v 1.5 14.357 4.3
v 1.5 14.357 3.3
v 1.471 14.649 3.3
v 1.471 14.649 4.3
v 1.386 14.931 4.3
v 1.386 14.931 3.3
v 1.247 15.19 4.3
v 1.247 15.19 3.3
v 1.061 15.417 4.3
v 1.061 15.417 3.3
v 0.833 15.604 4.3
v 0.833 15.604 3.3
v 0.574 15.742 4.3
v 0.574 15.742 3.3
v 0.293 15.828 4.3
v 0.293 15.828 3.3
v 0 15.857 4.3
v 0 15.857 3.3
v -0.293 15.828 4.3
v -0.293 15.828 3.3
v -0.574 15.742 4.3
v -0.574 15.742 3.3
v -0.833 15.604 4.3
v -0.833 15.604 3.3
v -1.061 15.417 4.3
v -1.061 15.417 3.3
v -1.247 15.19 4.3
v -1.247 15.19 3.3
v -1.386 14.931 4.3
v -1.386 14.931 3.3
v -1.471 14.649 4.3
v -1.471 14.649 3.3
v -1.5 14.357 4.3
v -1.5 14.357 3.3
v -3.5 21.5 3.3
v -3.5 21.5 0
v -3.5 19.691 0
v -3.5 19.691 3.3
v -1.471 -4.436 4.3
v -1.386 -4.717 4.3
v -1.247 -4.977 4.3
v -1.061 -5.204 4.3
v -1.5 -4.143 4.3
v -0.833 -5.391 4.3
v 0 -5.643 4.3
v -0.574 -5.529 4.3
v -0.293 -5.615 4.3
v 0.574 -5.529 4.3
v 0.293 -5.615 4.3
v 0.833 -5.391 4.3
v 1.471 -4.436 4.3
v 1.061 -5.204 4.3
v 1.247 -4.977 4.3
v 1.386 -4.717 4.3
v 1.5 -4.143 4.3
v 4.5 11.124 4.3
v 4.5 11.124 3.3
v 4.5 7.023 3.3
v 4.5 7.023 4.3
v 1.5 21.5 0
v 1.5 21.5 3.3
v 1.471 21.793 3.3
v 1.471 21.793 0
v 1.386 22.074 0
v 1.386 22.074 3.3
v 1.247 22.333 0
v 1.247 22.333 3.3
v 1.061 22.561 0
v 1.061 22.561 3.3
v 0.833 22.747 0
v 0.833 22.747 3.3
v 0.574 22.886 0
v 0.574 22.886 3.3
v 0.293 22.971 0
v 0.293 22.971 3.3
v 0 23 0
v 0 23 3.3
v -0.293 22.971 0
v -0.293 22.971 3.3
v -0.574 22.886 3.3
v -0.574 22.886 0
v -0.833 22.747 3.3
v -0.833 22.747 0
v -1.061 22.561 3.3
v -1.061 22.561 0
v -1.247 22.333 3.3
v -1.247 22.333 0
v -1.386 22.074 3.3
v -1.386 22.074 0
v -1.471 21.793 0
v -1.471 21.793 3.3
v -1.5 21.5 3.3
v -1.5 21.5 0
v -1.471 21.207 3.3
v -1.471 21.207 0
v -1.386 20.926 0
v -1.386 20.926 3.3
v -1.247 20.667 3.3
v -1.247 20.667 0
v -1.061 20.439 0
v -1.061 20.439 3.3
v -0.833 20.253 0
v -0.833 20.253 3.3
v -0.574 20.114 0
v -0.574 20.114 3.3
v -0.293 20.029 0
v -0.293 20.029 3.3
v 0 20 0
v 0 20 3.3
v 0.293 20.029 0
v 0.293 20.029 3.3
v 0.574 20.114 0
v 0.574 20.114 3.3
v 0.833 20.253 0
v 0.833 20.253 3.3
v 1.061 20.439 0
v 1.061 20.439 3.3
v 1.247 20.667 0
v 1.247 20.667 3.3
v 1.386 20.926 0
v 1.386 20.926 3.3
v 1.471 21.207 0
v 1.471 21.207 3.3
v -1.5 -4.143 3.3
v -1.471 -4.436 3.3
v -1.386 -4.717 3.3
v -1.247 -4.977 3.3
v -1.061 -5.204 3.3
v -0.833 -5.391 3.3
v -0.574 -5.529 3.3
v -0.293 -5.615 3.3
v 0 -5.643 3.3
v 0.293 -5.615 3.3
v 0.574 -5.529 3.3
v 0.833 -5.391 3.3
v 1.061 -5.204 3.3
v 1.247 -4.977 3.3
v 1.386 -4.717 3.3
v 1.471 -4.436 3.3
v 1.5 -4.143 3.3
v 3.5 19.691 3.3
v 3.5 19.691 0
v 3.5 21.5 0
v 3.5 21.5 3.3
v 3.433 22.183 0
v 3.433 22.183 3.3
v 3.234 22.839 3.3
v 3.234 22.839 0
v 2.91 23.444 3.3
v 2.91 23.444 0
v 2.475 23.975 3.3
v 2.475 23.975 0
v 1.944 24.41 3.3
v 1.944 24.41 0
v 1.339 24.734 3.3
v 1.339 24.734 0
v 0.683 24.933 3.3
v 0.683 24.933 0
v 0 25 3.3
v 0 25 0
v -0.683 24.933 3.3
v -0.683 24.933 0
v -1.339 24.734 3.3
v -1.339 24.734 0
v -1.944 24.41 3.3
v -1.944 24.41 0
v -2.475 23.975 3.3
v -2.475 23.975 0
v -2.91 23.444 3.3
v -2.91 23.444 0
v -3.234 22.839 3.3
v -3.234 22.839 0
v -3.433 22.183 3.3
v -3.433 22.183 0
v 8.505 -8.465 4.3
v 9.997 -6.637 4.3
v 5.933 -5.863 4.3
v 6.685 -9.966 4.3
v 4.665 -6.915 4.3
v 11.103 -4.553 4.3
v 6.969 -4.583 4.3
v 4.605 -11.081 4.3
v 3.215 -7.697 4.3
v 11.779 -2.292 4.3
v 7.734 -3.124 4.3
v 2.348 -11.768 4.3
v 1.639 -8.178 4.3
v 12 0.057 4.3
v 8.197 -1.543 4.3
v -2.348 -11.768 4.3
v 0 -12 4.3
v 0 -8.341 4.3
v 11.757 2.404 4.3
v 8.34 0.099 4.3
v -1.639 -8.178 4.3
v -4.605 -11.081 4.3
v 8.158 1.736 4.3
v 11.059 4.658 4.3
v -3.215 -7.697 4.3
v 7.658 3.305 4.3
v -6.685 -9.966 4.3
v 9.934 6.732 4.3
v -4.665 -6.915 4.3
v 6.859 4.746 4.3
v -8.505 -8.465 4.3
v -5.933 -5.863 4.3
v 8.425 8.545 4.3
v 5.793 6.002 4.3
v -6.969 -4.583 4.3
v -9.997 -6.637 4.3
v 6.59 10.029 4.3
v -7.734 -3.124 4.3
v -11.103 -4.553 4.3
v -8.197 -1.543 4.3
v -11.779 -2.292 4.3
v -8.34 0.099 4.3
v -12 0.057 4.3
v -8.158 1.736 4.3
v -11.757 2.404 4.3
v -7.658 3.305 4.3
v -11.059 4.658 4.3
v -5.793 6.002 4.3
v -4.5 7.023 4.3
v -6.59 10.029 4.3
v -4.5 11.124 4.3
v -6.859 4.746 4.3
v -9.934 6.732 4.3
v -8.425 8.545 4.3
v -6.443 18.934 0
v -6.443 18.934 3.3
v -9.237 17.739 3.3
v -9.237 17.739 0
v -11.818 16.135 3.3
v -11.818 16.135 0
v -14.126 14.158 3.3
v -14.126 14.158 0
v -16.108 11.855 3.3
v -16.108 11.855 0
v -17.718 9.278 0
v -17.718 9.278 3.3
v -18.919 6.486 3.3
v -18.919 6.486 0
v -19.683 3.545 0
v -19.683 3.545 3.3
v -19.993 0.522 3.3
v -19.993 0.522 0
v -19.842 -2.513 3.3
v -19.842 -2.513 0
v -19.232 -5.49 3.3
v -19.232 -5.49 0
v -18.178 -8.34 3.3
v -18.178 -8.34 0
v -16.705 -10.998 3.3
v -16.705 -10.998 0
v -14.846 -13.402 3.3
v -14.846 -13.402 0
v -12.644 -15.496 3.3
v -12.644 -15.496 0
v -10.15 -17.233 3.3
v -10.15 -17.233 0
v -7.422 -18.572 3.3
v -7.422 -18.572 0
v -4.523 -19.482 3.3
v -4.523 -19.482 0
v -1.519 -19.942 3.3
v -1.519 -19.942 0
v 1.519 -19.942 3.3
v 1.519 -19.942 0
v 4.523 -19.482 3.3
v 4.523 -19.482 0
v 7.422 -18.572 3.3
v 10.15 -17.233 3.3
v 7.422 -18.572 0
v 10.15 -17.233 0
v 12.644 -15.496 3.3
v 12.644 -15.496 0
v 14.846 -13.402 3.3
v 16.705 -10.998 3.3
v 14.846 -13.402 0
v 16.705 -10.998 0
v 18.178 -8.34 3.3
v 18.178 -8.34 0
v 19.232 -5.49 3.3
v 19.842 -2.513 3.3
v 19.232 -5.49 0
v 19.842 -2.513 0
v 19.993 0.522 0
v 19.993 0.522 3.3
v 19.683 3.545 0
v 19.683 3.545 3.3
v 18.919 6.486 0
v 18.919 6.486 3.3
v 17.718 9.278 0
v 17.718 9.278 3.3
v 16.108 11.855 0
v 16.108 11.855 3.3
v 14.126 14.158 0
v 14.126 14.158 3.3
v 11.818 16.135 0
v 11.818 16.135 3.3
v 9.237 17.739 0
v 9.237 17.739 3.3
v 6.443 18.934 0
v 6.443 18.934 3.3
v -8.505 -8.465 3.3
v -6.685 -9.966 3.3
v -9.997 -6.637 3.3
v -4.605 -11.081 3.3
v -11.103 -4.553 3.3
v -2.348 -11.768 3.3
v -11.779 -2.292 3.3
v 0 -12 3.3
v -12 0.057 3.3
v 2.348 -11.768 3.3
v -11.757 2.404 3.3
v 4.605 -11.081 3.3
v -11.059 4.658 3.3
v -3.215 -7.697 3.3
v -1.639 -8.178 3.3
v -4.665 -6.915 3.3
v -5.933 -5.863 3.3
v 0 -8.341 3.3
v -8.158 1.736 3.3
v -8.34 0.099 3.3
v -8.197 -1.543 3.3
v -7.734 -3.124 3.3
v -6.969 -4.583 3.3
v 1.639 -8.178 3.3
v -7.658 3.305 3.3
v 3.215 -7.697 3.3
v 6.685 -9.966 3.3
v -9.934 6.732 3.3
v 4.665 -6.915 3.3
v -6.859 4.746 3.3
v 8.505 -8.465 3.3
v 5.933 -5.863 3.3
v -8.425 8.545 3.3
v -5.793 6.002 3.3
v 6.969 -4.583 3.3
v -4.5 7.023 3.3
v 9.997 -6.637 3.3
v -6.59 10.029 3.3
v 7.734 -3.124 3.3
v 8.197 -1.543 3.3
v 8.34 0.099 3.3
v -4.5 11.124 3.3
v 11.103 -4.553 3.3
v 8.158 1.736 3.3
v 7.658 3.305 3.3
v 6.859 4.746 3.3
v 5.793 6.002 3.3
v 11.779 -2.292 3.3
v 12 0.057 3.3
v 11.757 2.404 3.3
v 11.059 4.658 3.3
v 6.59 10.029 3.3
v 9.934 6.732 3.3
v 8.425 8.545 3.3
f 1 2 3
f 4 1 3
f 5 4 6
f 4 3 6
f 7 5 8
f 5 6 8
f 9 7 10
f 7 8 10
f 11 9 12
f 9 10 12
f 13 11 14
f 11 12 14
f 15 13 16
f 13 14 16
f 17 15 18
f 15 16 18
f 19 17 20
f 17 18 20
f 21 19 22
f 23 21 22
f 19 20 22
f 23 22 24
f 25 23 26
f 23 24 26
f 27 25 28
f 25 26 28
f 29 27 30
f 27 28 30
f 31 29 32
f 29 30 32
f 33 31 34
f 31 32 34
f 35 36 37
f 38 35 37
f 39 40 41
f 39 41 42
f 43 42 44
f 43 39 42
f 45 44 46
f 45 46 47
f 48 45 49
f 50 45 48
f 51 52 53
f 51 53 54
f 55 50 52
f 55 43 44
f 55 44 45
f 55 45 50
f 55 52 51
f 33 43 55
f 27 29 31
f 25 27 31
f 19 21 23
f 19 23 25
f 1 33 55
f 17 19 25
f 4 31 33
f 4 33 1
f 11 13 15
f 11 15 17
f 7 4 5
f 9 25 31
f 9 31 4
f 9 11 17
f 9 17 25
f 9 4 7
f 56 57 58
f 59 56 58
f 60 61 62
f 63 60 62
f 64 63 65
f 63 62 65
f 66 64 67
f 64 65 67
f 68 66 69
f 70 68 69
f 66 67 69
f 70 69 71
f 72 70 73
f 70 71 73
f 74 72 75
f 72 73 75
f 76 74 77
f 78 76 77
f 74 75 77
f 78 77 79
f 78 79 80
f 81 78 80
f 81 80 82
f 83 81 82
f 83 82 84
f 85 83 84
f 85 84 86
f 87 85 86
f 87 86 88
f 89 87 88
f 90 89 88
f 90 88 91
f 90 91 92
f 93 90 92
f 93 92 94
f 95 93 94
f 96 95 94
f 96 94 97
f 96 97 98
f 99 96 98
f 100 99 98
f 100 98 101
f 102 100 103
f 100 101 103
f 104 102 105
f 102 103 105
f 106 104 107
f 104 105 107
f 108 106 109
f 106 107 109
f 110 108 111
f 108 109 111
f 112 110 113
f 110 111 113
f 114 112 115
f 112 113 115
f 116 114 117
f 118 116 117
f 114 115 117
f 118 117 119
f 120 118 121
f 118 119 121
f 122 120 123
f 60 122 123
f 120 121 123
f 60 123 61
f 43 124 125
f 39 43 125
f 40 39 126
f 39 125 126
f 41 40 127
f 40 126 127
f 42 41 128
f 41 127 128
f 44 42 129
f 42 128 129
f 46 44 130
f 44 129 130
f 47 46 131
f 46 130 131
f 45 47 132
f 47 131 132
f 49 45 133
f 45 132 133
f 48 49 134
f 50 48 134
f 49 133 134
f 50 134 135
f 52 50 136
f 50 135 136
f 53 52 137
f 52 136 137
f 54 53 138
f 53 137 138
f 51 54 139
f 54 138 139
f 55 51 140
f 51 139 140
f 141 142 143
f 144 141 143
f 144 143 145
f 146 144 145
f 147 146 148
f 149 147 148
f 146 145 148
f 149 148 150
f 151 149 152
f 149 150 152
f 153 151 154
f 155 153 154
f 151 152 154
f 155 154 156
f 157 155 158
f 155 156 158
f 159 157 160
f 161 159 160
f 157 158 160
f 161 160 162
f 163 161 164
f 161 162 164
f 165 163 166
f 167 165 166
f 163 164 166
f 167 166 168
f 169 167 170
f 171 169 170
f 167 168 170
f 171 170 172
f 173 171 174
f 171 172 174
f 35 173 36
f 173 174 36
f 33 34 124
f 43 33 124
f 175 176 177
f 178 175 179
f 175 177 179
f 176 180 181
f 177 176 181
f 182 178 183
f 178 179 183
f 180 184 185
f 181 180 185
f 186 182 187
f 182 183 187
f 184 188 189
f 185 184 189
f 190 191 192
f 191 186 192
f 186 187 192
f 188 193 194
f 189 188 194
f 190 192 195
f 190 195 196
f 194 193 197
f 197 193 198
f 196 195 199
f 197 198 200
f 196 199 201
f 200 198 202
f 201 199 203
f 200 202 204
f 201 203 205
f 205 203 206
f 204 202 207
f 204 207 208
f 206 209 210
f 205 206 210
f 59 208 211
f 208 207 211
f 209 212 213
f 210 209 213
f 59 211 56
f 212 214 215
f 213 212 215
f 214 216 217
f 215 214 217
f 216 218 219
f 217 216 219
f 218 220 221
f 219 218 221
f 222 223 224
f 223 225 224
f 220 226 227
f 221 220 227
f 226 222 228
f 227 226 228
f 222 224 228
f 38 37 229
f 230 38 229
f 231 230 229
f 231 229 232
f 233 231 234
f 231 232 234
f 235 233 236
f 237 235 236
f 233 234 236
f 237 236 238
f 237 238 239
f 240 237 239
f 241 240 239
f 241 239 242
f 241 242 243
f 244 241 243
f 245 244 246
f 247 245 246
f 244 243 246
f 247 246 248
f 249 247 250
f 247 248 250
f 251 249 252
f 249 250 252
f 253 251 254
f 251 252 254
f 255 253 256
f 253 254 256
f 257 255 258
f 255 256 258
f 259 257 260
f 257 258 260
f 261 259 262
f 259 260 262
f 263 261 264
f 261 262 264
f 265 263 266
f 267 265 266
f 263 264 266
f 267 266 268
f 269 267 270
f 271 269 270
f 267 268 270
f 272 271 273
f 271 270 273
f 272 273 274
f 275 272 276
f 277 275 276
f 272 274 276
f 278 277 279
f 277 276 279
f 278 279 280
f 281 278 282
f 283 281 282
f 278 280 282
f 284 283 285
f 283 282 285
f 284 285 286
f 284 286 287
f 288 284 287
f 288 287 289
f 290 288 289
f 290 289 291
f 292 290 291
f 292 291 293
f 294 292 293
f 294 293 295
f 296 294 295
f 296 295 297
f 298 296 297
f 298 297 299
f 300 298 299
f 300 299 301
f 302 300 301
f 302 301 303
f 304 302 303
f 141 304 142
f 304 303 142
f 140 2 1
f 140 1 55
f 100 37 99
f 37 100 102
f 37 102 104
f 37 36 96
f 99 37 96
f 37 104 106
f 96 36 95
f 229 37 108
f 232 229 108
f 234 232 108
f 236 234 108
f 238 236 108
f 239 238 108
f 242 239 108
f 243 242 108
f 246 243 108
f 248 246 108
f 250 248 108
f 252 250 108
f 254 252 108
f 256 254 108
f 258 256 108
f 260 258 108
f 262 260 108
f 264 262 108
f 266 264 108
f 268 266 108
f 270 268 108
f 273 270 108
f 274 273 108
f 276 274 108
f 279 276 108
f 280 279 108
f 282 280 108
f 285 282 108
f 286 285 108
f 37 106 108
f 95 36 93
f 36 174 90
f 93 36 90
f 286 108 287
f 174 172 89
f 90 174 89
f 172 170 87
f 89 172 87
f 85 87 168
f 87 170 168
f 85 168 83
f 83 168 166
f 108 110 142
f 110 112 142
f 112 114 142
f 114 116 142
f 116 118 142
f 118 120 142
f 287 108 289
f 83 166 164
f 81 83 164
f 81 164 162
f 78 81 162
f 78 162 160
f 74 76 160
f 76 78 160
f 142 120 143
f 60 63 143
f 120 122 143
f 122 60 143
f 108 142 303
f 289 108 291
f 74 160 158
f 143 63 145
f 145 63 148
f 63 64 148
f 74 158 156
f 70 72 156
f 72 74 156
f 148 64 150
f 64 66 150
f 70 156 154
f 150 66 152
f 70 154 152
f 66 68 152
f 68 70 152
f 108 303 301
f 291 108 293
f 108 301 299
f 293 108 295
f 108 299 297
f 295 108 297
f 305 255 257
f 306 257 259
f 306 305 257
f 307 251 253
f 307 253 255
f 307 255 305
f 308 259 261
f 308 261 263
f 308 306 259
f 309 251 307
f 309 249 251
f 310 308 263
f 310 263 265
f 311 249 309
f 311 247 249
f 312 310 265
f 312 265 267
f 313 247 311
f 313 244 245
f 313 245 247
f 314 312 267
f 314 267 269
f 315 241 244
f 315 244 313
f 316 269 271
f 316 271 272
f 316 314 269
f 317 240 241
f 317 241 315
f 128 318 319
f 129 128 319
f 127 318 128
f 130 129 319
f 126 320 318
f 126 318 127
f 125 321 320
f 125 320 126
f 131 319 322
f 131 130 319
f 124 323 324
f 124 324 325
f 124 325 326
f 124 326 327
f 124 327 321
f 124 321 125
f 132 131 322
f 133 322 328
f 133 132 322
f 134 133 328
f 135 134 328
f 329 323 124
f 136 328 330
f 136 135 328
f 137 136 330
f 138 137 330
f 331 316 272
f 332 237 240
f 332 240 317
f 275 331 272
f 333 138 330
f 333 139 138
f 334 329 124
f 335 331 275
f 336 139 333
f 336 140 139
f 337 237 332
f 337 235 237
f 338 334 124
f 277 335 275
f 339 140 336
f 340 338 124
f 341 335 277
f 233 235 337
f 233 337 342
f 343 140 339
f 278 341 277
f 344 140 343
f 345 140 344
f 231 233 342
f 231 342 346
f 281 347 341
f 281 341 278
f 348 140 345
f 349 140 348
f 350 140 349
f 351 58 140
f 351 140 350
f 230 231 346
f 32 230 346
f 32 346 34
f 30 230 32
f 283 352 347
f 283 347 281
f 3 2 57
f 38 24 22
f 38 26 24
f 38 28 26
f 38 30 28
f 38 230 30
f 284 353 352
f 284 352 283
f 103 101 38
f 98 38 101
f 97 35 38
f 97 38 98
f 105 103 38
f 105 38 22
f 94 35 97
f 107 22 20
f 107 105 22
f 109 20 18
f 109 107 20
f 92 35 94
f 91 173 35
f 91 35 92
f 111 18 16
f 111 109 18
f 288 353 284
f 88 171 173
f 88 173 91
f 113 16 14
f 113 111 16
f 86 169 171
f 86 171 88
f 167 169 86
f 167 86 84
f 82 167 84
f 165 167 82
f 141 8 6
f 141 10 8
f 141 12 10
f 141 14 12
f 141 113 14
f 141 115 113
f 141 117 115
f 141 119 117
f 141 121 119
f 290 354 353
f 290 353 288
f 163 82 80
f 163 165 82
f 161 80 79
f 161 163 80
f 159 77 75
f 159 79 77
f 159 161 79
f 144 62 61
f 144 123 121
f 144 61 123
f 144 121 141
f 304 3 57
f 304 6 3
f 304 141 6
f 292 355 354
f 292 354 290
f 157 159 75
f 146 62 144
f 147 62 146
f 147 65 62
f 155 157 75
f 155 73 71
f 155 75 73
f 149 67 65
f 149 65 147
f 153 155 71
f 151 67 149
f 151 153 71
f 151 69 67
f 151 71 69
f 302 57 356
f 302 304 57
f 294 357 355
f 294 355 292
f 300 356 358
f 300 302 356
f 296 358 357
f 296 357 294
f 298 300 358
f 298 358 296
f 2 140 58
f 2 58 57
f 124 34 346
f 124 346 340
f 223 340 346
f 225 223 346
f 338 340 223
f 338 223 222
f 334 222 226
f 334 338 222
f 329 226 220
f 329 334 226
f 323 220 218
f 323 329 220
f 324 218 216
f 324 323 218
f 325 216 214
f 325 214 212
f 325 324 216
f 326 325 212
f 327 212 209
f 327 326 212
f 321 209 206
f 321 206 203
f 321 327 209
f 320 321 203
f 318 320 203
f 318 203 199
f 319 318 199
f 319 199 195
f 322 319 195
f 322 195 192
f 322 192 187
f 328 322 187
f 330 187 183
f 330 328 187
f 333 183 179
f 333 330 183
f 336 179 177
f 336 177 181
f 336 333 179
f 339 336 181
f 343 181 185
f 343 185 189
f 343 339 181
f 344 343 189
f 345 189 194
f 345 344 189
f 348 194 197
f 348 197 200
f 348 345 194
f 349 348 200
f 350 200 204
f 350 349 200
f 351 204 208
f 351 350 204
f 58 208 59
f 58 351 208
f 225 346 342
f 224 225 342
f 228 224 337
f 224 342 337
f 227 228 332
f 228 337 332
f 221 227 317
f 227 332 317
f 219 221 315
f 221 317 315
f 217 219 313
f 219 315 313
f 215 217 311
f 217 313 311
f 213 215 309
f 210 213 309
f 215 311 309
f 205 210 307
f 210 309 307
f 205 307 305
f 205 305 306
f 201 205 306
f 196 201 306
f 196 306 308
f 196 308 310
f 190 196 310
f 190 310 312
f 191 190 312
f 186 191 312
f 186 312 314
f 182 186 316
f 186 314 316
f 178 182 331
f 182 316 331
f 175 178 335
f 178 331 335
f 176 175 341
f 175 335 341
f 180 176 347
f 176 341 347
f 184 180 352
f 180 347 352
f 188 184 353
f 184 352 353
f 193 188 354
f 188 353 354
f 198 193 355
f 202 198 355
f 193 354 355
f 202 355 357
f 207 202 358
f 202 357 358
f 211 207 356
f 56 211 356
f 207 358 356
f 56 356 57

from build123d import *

# Parameters (mm, degrees)
EXTRUDE_DEPTH = 3.3
SKETCH001_R   = 1.5
POCKET_DEPTH  = 3.301
PAD_DEPTH     = 1


with BuildPart() as part:
    # Sketch → Extrude (new body)
    with BuildSketch(Plane.XY):
        with BuildLine():
            ThreePointArc((3.5, 21.5), (0, 25), (-3.5, 21.5))
            Line((-3.5, 21.5), (-3.5, 19.691369))
            ThreePointArc((-3.5, 19.691369), (0, -20), (3.5, 19.691369))
            Line((3.5, 19.691369), (3.5, 21.5))
        make_face()
    extrude(amount=EXTRUDE_DEPTH)

    # Sketch001 → Pocket (cut, through all)
    with BuildSketch(Plane.XY.offset(3.3)):
        with Locations((0, 21.5)):
            Circle(SKETCH001_R)
    extrude(amount=-POCKET_DEPTH, mode=Mode.SUBTRACT)

    # Sketch002 → Pad (new body)
    with BuildSketch(Plane.XY.offset(3.3)):
        with BuildLine():
            ThreePointArc((-4.5, 7.022984), (0, -8.341002), (4.5, 7.022984))
            Line((4.5, 11.124298), (4.5, 7.022984))
            ThreePointArc((-4.5, 11.124298), (0, -12), (4.5, 11.124298))
            Line((-4.5, 7.022984), (-4.5, 11.124298))
        make_face()
        with BuildLine():
            ThreePointArc((1.5, 14.356668), (0, 15.856668), (-1.5, 14.356668))
            Line((-1.5, 14.356668), (-1.5, -4.143332))
            ThreePointArc((-1.5, -4.143332), (0, -5.643332), (1.5, -4.143332))
            Line((1.5, 14.356668), (1.5, -4.143332))
        make_face()
    extrude(amount=PAD_DEPTH)


solid = part.part
